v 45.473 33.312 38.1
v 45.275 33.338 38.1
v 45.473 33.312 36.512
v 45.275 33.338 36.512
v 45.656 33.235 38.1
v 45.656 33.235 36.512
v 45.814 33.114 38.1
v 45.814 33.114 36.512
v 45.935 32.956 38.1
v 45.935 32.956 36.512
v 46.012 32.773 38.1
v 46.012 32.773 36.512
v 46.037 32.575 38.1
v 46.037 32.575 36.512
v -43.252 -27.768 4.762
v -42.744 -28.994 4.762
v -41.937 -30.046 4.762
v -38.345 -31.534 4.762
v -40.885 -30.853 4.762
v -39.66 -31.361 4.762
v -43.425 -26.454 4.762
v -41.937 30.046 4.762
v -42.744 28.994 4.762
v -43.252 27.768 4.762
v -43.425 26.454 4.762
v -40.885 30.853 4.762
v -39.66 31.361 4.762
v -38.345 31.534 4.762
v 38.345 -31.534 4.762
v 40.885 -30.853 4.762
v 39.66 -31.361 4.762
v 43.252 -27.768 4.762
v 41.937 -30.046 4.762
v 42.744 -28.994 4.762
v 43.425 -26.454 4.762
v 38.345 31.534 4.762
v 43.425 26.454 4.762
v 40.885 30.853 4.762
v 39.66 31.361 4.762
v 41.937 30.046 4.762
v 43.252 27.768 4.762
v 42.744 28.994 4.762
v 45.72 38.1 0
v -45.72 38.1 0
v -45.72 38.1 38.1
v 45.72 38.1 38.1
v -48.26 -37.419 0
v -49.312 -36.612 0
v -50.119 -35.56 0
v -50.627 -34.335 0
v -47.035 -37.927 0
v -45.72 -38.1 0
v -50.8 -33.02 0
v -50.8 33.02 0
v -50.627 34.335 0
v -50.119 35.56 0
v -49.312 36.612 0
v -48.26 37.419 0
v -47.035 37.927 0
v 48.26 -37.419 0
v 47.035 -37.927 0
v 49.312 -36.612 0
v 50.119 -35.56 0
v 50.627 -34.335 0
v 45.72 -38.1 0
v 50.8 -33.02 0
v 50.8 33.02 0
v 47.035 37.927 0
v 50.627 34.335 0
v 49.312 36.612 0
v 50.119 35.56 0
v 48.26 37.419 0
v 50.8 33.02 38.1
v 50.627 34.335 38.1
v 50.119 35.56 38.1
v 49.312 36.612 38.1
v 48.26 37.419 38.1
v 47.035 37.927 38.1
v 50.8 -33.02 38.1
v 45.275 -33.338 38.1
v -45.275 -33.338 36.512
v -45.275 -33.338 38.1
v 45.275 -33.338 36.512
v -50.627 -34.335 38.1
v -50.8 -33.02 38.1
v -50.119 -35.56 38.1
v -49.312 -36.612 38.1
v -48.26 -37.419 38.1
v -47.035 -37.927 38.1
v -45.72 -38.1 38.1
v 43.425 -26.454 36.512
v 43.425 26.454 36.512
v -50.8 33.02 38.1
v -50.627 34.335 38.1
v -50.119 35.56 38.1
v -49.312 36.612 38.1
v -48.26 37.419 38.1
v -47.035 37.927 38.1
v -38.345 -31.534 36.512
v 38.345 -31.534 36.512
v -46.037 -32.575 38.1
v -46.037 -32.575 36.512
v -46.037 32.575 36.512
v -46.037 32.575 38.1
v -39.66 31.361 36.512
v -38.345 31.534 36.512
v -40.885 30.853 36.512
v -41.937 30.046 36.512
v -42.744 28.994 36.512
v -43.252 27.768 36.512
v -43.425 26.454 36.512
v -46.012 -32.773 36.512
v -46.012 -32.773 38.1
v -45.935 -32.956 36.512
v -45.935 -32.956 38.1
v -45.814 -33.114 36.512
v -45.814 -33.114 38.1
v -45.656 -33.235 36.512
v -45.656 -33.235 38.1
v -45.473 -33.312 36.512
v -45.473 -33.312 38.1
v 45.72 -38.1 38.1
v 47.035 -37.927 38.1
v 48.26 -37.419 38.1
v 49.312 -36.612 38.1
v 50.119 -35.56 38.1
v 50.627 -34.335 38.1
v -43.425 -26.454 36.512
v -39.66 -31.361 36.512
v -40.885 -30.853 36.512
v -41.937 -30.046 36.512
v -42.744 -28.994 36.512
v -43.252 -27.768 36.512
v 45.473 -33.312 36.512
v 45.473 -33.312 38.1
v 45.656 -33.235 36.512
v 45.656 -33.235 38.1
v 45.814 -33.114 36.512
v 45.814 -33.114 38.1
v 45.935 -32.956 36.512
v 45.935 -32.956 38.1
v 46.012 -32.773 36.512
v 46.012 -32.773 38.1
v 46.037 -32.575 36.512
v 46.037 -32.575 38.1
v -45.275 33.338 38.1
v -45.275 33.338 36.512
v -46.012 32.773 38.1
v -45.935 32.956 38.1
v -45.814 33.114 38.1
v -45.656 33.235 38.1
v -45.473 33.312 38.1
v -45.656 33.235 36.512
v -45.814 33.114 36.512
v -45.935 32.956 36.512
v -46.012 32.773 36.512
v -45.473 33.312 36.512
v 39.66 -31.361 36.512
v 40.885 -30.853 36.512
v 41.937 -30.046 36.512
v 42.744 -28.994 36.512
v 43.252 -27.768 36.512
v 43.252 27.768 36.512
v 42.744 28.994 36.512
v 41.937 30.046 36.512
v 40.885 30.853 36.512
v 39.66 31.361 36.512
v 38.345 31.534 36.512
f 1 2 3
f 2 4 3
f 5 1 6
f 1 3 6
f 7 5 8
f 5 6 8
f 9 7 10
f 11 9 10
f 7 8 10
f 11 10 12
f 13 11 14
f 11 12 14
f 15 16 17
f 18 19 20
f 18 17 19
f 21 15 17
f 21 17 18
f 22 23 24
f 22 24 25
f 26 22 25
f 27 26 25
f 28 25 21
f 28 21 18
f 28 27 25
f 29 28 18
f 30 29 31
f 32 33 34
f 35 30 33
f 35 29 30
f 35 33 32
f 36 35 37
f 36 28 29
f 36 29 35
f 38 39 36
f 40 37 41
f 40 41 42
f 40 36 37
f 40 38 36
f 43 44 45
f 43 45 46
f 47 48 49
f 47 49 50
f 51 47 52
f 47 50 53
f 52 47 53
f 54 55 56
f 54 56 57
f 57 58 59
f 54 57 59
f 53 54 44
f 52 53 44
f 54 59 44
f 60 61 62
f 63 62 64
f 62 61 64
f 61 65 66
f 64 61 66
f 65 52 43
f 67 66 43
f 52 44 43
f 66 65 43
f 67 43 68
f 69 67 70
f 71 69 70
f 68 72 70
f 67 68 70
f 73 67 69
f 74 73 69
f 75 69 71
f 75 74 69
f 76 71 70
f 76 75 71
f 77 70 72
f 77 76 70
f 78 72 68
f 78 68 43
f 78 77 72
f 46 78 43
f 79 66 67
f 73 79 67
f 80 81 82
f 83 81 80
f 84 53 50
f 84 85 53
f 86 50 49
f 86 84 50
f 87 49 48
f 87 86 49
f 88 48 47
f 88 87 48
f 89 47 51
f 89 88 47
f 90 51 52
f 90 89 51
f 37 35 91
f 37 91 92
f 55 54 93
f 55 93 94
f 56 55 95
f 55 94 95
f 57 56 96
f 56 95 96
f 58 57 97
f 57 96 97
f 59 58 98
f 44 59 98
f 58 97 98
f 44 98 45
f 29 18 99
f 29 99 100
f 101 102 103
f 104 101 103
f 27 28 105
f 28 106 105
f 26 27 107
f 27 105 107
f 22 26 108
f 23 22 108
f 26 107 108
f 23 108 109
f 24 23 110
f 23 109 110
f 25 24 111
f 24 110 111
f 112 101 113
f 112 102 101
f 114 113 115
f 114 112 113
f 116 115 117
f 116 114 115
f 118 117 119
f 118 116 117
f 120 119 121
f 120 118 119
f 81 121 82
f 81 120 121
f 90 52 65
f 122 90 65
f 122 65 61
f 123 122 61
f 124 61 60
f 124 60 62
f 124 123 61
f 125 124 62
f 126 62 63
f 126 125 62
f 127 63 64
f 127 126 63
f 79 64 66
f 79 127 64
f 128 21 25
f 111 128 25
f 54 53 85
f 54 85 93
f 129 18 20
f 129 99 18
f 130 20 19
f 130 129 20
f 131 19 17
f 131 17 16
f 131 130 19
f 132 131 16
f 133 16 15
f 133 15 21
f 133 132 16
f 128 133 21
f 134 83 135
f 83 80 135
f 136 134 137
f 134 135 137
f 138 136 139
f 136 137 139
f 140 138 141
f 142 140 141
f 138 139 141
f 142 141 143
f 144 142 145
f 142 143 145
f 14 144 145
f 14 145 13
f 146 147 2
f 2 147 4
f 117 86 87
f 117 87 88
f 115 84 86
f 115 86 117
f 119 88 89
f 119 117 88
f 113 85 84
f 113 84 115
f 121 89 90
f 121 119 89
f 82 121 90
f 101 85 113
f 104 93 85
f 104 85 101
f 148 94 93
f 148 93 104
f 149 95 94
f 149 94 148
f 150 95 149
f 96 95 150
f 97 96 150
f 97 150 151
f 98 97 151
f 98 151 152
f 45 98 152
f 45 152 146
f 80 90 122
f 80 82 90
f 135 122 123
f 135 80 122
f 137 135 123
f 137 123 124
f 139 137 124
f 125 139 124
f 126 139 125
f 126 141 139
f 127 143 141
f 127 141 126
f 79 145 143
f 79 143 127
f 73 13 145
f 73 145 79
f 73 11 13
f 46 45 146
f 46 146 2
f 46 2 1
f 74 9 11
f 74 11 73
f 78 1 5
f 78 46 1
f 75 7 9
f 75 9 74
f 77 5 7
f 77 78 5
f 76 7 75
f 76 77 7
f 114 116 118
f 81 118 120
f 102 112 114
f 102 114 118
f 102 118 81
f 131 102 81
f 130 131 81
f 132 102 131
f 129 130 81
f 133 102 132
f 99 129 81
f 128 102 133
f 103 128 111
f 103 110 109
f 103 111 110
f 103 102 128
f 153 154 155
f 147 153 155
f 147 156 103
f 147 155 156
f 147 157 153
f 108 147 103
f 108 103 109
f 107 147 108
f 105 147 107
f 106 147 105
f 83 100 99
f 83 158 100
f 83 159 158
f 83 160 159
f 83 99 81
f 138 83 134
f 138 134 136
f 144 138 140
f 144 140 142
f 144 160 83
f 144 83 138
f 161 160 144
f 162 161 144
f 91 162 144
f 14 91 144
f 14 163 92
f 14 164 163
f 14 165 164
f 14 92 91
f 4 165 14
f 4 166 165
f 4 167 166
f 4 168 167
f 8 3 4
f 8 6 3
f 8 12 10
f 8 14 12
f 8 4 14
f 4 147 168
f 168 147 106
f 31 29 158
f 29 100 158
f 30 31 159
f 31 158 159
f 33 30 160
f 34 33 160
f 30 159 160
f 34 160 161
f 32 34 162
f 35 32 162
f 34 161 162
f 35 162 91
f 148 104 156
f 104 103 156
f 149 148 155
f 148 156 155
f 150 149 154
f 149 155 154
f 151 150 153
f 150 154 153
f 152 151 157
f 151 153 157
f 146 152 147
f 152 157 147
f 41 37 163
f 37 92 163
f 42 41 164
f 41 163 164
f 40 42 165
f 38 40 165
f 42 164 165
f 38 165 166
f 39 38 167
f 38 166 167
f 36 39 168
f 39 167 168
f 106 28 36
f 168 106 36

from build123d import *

# Parameters (mm, degrees)
F0_W     = 101.6
F0_H     = 76.2
F1_DEPTH = 38.1
F2_T     = -4.7625
F3_W     = 92.075
F3_H     = 66.675
F3_W_2   = 86.8494564931
F3_H_2   = 63.0672035732
F4_DEPTH = 31.75
F5_R     = 0.762
F6_R     = 5.08
F7_R     = 5.08


with BuildPart() as f1:
    # F0 (on Top) → F1 (new body)
    with BuildSketch(Plane.XY):
        Rectangle(F0_W, F0_H)
    extrude(amount=F1_DEPTH)

    # F2
    f2_openings = [f1.faces().sort_by_distance(p)[0] for p in [
        (0, 0, 38.1),
    ]]
    offset(amount=F2_T, openings=f2_openings)

    # F3 (on face) → F4 (join)
    with BuildSketch(Plane.XY.offset(4.7625)):
        Rectangle(F3_W, F3_H)
        Rectangle(F3_W_2, F3_H_2, mode=Mode.SUBTRACT)
    extrude(amount=F4_DEPTH)

    # F5
    f5_edges = [f1.edges().sort_by_distance(p)[0] for p in [
        (-46.0375, 33.3375, 37.30625),
        (46.0375, 33.3375, 37.30625),
        (46.0375, -33.3375, 37.30625),
        (-46.0375, -33.3375, 37.30625),
    ]]
    fillet(f5_edges, radius=F5_R)

    # F6
    f6_edges = [f1.edges().sort_by_distance(p)[0] for p in [
        (43.424728, 31.533602, 20.6375),
        (43.424728, -31.533602, 20.6375),
        (-43.424728, -31.533602, 20.6375),
        (-43.424728, 31.533602, 20.6375),
    ]]
    fillet(f6_edges, radius=F6_R)

    # F7
    f7_edges = [f1.edges().sort_by_distance(p)[0] for p in [
        (50.8, 38.1, 19.05),
        (50.8, -38.1, 19.05),
        (-50.8, 38.1, 19.05),
        (-50.8, -38.1, 19.05),
    ]]
    fillet(f7_edges, radius=F7_R)


solid = f1.part
